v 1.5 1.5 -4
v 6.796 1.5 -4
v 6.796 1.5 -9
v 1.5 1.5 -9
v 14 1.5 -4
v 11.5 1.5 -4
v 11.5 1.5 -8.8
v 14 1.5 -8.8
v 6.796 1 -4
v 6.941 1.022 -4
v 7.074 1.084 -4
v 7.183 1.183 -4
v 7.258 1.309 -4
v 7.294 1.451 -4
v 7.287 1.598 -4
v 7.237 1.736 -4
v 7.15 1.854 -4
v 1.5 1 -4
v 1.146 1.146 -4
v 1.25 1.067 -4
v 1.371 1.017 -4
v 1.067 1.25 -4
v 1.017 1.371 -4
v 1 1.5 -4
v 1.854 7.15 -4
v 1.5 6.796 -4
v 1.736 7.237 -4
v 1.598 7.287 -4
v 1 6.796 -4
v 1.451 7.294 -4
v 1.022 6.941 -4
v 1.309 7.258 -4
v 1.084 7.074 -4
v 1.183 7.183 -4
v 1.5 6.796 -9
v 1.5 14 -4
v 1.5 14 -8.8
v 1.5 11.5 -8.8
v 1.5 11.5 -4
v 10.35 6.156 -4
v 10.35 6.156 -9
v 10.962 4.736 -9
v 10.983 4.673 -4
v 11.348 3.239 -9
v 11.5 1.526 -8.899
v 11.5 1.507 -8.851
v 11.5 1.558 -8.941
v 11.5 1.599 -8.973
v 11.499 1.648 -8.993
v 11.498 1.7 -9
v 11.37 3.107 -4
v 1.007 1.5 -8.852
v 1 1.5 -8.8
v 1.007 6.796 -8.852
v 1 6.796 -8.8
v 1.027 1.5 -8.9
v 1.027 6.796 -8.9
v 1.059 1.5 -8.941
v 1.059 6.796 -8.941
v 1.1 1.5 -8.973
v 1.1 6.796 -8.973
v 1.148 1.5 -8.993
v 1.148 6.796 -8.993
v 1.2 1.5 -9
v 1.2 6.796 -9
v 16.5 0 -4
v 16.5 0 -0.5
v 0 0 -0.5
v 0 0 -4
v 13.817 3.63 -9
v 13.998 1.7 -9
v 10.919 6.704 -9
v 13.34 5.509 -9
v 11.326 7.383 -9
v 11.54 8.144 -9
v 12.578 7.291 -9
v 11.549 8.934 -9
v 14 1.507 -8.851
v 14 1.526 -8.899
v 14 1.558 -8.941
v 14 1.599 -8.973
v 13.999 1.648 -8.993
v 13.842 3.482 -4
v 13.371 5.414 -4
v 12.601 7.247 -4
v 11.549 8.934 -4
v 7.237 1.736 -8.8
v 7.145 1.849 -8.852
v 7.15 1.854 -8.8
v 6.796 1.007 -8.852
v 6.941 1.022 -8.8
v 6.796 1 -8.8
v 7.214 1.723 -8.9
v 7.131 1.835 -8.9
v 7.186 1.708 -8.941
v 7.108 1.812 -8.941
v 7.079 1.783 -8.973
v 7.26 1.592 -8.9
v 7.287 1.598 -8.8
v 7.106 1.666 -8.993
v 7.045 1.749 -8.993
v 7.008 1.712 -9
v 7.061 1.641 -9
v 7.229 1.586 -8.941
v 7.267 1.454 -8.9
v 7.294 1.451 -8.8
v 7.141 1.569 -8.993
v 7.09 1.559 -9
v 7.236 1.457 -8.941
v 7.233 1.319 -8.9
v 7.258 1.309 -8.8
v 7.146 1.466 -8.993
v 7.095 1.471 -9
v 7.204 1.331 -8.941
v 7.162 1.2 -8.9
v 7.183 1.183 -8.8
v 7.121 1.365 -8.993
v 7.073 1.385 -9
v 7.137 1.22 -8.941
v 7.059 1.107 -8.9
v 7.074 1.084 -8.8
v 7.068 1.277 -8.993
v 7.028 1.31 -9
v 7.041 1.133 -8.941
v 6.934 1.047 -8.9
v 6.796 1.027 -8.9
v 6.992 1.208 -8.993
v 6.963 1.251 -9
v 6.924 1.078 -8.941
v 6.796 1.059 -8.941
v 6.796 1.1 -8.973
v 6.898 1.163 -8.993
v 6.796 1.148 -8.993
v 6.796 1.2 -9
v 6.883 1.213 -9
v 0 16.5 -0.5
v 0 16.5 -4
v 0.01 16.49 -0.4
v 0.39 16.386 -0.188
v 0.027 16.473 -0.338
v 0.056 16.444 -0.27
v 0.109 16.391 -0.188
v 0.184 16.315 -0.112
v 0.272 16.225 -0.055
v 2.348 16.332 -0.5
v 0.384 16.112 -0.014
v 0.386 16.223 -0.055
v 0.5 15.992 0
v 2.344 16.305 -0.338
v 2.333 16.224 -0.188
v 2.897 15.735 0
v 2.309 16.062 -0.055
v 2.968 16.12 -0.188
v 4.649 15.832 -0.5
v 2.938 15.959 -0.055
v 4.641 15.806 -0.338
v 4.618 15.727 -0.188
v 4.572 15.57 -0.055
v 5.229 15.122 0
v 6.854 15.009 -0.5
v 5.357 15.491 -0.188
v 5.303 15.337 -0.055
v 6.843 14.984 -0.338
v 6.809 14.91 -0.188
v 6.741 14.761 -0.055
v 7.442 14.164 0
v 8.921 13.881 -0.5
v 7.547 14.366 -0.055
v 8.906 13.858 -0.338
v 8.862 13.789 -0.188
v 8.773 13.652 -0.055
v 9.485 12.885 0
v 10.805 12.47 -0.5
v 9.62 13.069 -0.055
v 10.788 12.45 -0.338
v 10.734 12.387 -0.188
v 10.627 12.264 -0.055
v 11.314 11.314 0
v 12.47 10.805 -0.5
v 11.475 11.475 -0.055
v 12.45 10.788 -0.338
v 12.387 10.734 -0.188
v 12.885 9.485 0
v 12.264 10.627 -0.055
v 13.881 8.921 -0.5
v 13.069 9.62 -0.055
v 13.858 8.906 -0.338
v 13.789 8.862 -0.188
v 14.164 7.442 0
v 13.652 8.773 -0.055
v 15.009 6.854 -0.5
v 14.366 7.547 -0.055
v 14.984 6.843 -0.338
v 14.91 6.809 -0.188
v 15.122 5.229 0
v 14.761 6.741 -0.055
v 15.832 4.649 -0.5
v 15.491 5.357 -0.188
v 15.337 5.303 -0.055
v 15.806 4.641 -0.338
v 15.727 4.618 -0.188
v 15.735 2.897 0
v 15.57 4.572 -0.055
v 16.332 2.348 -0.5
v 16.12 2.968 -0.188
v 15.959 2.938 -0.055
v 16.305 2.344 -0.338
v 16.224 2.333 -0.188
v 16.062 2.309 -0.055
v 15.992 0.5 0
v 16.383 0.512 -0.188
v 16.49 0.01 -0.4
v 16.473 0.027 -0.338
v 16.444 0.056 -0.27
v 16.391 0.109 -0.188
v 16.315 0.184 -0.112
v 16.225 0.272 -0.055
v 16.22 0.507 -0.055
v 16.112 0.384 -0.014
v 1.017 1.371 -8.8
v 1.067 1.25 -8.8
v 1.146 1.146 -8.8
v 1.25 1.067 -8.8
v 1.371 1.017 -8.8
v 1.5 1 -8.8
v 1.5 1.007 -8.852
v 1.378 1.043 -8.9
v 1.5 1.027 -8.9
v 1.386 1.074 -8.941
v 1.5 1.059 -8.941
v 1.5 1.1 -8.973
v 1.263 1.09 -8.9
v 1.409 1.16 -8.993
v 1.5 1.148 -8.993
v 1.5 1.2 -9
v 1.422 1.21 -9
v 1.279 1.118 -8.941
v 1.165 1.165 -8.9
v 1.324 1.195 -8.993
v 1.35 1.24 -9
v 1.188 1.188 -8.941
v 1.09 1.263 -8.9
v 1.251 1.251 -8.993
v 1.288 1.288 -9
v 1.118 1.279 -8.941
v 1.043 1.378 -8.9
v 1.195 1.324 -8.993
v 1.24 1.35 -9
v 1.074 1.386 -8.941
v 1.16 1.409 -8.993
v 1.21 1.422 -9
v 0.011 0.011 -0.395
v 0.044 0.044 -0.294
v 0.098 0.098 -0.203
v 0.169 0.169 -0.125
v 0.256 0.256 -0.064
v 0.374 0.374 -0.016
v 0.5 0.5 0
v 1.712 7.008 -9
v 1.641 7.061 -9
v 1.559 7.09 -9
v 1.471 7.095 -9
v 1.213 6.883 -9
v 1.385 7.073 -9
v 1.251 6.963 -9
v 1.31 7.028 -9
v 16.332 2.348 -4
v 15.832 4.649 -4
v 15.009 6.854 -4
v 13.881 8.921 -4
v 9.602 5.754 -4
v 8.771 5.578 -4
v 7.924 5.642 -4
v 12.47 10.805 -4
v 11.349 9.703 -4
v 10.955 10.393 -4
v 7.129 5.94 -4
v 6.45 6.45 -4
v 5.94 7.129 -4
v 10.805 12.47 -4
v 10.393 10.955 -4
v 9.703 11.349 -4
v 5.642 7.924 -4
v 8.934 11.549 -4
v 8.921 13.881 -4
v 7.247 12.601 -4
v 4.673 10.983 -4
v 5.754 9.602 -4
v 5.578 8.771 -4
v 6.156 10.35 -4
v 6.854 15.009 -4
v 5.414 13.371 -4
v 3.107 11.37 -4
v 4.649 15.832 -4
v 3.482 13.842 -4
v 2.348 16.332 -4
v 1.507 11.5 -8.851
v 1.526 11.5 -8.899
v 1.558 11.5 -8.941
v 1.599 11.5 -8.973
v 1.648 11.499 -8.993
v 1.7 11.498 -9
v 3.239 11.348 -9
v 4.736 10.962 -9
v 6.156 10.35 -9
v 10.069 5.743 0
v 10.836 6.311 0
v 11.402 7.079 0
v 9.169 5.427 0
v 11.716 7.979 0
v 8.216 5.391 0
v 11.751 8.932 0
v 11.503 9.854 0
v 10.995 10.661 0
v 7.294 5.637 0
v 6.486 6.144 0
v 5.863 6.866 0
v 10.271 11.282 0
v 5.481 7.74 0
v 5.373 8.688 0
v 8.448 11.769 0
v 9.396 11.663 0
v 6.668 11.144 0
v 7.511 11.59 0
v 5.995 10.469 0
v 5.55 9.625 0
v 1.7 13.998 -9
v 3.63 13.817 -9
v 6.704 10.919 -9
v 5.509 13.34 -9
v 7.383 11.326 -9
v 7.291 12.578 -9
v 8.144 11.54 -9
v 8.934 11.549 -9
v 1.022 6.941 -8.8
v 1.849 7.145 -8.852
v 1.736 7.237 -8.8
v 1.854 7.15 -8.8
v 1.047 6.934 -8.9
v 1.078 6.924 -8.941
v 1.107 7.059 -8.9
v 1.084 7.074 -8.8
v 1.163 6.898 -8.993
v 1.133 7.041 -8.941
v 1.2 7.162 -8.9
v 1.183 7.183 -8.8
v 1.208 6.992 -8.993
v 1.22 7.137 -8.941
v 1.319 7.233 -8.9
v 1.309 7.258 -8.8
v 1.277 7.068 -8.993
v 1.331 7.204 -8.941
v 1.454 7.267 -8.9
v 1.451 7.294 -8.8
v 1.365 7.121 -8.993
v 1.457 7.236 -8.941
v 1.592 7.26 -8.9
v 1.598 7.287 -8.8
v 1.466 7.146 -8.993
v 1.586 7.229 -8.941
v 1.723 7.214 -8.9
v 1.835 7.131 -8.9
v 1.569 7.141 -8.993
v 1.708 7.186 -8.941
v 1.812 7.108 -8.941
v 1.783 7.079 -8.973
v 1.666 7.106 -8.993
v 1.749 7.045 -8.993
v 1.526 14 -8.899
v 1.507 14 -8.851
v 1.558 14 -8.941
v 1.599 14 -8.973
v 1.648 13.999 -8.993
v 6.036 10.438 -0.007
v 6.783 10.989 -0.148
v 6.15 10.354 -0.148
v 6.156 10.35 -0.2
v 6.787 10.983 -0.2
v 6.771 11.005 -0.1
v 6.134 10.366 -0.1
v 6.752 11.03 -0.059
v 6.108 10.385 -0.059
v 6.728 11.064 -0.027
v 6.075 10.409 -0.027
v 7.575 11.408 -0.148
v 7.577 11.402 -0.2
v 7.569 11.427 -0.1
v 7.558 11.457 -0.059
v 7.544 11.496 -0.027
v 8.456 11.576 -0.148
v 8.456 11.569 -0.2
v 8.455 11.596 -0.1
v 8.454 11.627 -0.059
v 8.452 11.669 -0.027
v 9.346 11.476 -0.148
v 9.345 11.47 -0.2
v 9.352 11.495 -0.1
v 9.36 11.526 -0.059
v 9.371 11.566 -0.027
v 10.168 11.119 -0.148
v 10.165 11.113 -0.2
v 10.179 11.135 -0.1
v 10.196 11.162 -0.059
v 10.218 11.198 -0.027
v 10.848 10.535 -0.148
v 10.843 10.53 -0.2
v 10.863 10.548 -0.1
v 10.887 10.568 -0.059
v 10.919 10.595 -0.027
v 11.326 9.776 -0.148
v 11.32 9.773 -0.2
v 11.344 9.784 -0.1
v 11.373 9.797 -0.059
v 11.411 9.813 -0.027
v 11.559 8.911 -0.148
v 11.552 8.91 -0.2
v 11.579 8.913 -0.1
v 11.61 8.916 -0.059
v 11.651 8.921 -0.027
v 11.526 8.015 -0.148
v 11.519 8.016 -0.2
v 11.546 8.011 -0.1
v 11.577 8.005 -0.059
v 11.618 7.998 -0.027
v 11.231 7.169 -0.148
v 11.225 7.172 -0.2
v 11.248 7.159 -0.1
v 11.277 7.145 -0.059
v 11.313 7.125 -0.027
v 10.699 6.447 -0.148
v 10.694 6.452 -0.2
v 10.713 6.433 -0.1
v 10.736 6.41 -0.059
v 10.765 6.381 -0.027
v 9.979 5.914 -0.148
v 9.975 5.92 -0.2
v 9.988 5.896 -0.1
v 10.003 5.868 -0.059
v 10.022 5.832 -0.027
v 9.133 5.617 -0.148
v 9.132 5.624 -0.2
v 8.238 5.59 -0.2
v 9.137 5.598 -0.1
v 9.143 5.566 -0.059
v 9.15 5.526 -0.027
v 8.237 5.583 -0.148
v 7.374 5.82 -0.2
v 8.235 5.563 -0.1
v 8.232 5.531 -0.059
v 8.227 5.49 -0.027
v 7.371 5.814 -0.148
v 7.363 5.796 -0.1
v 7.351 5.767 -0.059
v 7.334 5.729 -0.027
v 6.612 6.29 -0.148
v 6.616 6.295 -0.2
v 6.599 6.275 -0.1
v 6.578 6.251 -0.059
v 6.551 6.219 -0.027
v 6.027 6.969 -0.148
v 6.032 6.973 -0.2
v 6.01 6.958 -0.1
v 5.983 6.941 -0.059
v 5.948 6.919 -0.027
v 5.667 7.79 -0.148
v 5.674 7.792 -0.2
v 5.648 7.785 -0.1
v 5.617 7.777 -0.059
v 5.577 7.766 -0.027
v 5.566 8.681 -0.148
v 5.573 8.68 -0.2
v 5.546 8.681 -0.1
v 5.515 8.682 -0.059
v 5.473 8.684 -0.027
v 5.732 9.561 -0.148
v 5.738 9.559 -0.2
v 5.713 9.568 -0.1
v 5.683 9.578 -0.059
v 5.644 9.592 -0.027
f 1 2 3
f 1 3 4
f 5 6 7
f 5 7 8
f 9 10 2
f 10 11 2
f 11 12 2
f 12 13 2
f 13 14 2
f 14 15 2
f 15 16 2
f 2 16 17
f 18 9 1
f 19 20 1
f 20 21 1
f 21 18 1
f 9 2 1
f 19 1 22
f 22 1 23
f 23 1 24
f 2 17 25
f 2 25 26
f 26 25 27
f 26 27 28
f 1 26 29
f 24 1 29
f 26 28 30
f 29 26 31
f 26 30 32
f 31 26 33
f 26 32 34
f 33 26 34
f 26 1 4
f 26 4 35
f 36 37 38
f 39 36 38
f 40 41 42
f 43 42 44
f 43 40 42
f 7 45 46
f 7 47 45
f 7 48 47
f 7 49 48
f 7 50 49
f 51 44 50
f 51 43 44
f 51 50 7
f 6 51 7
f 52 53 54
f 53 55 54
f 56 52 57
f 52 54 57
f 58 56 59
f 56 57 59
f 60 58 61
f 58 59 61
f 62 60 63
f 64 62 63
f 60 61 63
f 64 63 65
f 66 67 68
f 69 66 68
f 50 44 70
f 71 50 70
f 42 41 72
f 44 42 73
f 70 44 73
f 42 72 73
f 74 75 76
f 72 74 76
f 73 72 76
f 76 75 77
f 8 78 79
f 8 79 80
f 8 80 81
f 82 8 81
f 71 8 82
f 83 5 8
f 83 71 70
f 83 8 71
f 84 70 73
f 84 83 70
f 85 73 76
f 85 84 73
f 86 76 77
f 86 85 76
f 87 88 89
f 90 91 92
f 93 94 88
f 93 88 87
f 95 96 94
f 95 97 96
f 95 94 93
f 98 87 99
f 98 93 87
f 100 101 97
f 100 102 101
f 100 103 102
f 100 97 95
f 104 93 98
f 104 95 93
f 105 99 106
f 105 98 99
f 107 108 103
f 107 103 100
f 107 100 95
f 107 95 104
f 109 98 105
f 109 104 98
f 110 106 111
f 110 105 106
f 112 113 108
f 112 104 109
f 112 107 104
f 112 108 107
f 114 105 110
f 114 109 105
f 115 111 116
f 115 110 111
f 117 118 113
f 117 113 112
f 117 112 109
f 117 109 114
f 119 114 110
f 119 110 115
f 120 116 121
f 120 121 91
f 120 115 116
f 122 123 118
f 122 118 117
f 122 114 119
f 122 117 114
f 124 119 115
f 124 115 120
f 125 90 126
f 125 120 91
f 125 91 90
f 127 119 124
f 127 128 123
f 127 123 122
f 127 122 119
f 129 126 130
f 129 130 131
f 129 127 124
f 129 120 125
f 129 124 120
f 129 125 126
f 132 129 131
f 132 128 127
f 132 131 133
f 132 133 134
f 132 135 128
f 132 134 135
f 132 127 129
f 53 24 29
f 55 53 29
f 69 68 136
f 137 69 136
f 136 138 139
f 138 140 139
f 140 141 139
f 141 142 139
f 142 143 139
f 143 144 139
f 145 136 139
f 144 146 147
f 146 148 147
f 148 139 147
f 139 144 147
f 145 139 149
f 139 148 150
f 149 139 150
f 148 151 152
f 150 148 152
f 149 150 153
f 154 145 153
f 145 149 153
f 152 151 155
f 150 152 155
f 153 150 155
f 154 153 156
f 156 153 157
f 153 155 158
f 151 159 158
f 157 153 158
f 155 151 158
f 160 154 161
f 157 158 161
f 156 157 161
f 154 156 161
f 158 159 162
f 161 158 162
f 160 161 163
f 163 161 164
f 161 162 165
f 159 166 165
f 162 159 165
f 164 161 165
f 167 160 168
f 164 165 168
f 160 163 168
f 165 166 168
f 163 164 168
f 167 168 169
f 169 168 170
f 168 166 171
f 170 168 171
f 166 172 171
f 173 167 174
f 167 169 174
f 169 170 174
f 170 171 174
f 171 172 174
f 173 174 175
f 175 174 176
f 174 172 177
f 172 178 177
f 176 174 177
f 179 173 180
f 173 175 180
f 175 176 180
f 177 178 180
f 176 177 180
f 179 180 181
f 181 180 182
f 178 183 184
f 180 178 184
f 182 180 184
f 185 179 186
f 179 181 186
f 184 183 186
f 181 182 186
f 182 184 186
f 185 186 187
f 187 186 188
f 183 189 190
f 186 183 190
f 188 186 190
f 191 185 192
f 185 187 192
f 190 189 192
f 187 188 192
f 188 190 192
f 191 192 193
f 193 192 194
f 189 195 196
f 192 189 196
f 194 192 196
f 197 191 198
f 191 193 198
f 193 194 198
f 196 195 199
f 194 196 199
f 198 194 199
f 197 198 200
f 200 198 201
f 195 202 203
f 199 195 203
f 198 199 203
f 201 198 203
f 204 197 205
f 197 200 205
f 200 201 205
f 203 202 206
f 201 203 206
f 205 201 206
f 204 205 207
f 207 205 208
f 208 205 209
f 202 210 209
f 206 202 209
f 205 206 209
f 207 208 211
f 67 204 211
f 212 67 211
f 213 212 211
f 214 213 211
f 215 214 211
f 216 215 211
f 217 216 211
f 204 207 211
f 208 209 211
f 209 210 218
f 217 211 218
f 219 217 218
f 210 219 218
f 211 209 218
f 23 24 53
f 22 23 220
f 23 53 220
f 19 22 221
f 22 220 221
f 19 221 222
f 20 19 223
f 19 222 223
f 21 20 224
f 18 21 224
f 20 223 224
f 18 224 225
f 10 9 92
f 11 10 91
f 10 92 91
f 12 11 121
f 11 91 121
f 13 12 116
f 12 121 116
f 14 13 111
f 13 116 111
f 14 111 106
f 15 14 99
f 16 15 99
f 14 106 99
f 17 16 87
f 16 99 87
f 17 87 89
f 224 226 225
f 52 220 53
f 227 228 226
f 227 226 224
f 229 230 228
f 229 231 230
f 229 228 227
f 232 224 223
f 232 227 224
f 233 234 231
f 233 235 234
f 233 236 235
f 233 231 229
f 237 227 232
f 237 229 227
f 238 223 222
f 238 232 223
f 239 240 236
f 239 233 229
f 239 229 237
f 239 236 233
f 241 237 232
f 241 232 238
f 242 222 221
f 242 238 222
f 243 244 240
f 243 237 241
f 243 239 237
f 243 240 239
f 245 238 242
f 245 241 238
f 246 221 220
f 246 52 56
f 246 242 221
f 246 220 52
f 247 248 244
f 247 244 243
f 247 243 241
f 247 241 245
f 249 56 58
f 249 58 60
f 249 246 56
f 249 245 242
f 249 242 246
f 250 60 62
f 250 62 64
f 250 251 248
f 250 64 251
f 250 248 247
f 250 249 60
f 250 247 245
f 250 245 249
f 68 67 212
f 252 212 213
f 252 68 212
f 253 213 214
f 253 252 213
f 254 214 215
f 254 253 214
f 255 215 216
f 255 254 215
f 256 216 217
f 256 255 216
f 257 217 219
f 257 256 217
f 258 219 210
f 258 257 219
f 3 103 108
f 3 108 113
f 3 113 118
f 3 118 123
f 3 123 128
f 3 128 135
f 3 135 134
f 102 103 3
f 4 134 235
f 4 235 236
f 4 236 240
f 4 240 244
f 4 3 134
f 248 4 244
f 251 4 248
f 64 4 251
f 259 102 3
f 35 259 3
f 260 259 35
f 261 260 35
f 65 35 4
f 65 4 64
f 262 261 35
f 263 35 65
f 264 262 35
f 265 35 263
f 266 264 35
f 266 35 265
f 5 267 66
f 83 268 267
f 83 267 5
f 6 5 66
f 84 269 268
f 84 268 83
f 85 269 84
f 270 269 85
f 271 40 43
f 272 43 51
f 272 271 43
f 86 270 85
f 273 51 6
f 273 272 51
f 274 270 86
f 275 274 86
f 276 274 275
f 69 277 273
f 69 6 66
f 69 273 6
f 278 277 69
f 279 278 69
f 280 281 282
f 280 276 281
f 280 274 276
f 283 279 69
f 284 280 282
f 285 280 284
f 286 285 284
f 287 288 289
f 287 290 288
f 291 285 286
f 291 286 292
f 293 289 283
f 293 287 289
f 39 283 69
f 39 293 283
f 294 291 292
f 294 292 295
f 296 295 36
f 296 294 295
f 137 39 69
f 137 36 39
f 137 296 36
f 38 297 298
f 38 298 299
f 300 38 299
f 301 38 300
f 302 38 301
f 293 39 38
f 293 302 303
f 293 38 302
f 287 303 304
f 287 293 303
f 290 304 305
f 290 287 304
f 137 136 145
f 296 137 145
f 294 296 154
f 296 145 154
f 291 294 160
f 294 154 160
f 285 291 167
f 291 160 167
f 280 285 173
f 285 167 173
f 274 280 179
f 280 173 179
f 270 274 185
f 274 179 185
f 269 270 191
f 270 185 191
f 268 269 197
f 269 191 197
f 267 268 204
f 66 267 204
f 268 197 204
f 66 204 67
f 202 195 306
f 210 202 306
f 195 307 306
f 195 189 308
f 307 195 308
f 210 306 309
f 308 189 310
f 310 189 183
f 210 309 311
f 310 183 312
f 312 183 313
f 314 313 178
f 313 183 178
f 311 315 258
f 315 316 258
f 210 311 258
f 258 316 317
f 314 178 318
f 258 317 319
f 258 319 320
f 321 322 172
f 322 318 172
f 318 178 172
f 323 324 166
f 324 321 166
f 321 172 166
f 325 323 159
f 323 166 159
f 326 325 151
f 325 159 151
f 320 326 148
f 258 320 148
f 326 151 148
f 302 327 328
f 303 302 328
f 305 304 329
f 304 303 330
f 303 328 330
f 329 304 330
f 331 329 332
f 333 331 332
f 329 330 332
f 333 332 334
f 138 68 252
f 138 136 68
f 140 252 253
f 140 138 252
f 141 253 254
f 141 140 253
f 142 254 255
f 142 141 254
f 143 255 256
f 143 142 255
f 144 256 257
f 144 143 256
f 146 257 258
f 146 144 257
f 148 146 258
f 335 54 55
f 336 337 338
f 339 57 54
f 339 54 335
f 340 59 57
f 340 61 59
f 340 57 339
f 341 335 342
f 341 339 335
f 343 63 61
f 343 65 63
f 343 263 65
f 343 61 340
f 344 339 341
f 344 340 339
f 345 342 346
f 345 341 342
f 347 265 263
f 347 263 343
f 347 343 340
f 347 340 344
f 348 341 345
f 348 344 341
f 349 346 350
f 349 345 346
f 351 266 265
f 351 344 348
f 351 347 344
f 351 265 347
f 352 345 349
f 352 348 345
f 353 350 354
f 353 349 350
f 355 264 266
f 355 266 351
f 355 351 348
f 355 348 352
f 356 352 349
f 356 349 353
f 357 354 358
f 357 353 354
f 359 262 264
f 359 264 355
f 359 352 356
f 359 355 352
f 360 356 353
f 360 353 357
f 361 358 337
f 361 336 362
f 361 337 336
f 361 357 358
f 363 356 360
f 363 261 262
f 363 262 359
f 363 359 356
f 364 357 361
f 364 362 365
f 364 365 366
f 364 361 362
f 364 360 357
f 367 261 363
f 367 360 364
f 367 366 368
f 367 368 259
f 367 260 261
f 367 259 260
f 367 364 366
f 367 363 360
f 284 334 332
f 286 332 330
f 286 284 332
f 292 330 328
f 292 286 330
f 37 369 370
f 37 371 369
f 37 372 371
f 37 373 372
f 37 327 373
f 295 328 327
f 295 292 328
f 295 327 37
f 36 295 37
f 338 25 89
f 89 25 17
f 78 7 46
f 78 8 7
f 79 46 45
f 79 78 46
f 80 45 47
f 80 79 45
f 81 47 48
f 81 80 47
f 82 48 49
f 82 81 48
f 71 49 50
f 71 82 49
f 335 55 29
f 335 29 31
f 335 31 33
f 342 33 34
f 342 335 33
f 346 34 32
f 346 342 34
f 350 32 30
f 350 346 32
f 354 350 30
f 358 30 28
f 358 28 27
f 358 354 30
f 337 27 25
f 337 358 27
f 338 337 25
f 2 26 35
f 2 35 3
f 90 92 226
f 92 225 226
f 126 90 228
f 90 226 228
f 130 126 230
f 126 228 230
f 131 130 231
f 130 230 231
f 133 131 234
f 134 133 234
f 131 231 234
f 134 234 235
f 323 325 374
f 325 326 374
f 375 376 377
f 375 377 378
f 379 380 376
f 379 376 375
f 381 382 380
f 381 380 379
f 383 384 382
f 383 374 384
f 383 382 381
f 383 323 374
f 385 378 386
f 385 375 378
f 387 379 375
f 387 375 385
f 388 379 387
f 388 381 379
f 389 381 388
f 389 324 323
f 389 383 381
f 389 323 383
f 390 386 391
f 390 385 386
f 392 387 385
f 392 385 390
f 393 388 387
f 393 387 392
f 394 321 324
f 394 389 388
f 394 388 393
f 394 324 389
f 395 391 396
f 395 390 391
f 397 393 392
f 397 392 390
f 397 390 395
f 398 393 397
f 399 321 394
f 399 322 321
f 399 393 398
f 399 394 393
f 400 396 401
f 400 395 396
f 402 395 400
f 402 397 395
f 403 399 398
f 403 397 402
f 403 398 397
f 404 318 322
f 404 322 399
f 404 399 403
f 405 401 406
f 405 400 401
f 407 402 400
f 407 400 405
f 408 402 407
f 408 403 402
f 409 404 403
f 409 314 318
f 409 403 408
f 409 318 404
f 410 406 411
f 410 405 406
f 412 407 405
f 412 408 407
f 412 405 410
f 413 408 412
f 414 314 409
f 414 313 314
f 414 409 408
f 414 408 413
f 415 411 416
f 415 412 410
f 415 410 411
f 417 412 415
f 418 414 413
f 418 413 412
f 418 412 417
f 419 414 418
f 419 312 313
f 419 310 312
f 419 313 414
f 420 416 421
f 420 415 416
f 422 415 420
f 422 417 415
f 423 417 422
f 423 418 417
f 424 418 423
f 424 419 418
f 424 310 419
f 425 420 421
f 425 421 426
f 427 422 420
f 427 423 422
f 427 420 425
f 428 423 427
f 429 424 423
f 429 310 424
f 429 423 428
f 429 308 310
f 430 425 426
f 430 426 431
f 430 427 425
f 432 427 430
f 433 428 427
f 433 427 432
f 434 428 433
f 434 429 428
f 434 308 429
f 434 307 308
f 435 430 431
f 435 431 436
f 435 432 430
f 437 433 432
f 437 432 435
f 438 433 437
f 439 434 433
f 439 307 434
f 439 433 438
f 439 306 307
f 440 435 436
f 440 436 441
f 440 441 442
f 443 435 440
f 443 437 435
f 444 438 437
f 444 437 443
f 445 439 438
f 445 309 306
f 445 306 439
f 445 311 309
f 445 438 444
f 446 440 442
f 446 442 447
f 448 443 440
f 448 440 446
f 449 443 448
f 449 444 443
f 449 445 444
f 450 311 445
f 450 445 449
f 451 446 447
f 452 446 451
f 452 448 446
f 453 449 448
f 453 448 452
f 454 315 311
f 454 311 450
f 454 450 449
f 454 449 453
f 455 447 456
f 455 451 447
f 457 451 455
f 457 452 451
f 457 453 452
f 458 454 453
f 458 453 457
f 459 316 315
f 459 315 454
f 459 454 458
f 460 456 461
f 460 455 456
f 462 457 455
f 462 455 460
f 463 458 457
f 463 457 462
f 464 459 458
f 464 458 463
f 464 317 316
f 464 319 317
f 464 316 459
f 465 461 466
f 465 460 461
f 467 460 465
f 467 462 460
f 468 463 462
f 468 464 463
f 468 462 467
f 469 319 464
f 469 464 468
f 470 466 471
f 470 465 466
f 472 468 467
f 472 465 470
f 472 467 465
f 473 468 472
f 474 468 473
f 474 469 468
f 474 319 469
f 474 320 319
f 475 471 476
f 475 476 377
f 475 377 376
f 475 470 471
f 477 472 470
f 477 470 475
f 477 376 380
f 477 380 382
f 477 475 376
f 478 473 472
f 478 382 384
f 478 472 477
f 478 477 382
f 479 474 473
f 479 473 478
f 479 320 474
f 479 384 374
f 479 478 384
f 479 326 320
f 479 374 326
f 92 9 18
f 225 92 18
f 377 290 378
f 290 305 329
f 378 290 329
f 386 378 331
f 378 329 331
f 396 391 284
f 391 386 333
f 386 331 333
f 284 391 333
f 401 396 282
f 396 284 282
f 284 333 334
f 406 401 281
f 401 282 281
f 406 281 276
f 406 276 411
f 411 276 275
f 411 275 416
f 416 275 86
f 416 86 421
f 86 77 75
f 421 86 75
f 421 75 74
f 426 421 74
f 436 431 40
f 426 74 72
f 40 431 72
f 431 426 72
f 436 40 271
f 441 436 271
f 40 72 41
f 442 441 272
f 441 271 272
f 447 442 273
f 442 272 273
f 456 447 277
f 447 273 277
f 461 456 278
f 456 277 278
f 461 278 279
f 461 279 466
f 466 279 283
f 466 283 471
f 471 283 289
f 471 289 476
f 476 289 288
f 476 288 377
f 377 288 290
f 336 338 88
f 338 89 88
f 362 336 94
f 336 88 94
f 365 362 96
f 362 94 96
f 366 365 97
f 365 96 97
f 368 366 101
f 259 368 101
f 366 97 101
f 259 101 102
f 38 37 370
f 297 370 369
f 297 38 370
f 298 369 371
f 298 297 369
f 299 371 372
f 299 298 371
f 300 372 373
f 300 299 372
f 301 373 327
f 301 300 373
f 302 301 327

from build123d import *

# Parameters (mm, degrees)
BOSS_EXTRUDE2_DEPTH = 4
FILLET1_R           = 0.5
BOSS_EXTRUDE3_DEPTH = 5
EXTRUDE_THIN1_DEPTH = 5
FILLET5_R           = 0.5
FILLET6_R           = 0.2
FILLET7_R           = 0.2
SKETCH4_R           = 3
CUT_EXTRUDE1_DEPTH  = 7.5
FILLET8_R           = 0.2


with BuildPart() as part:
    # Sketch1 → Boss-Extrude2 (new body)
    with BuildSketch(Plane.XY):
        with BuildLine():
            Line((0, 16.5), (0, 0))
            Line((0, 0), (16.5, 0))
            ThreePointArc((16.5, 0), (11.66726189, 11.66726189), (0, 16.5))
        make_face()
    extrude(amount=-BOSS_EXTRUDE2_DEPTH)

    # Fillet1
    fillet1_edges = [part.edges().sort_by_distance(p)[0] for p in [
        (8.25, 0, 0),
        (0, 8.25, 0),
        (11.66726189, 11.66726189, 0),
    ]]
    fillet(fillet1_edges, radius=FILLET1_R)

    # Sketch2 → Boss-Extrude3 (add)
    with BuildSketch(Plane(origin=(0, 0, -4), x_dir=(-1, 0, 0), z_dir=(0, 0, -1))):
        with BuildLine():
            Line((-1.5, 14), (-1.5, 11.5))
            ThreePointArc((-1.5, 11.5), (-8.571067812, 8.571067812), (-11.5, 1.5))
            Line((-11.5, 1.5), (-14, 1.5))
            ThreePointArc((-14, 1.5), (-10.338834765, 10.338834765), (-1.5, 14))
        make_face()
    extrude(amount=BOSS_EXTRUDE3_DEPTH)

    # Fillet6
    fillet6_edges = [part.edges().sort_by_distance(p)[0] for p in [
        (1.5, 12.75, -9),
        (12.75, 1.5, -9),
    ]]
    fillet(fillet6_edges, radius=FILLET6_R)

    # Sketch4 → Cut-Extrude1 (cut, symmetric)
    with BuildSketch(Plane(origin=(0, 0, -4), x_dir=(-1, 0, 0), z_dir=(0, 0, -1))):
        with Locations((-8.571067812, 8.571067812)):
            Circle(SKETCH4_R)
    extrude(amount=CUT_EXTRUDE1_DEPTH, both=True, mode=Mode.SUBTRACT)

    # Fillet8
    fillet8_edges = [part.edges().sort_by_distance(p)[0] for p in [
        (11.571067812, 8.571067812, 0),
    ]]
    fillet(fillet8_edges, radius=FILLET8_R)


with BuildPart() as body_2:
    # Sketch2<3> → Extrude-Thin1 (new body)
    with BuildSketch(Plane(origin=(0, 0, -4), x_dir=(-1, 0, 0), z_dir=(0, 0, -1))):
        Polygon((-1, 1), (-1, 8.003336572), (-8.003336572, 1), align=None)
        Polygon((-1.5, 1.5), (-1.5, 6.796229791), (-6.796229791, 1.5), align=None, mode=Mode.SUBTRACT)
    extrude(amount=EXTRUDE_THIN1_DEPTH)

    # Fillet5
    fillet5_edges = [body_2.edges().sort_by_distance(p)[0] for p in [
        (1, 1, -6.5),
        (1, 8.003336572, -6.5),
        (8.003336572, 1, -6.5),
    ]]
    fillet(fillet5_edges, radius=FILLET5_R)

    # Fillet7
    fillet7_edges = [body_2.edges().sort_by_distance(p)[0] for p in [
        (7.258169557, 1.308658284, -9),
        (4.501668286, 4.501668286, -9),
        (1.308658284, 7.258169557, -9),
        (1, 4.148114896, -9),
        (1.146446609, 1.146446609, -9),
        (4.148114896, 1, -9),
    ]]
    fillet(fillet7_edges, radius=FILLET7_R)


solid = Compound([part.part, body_2.part])
